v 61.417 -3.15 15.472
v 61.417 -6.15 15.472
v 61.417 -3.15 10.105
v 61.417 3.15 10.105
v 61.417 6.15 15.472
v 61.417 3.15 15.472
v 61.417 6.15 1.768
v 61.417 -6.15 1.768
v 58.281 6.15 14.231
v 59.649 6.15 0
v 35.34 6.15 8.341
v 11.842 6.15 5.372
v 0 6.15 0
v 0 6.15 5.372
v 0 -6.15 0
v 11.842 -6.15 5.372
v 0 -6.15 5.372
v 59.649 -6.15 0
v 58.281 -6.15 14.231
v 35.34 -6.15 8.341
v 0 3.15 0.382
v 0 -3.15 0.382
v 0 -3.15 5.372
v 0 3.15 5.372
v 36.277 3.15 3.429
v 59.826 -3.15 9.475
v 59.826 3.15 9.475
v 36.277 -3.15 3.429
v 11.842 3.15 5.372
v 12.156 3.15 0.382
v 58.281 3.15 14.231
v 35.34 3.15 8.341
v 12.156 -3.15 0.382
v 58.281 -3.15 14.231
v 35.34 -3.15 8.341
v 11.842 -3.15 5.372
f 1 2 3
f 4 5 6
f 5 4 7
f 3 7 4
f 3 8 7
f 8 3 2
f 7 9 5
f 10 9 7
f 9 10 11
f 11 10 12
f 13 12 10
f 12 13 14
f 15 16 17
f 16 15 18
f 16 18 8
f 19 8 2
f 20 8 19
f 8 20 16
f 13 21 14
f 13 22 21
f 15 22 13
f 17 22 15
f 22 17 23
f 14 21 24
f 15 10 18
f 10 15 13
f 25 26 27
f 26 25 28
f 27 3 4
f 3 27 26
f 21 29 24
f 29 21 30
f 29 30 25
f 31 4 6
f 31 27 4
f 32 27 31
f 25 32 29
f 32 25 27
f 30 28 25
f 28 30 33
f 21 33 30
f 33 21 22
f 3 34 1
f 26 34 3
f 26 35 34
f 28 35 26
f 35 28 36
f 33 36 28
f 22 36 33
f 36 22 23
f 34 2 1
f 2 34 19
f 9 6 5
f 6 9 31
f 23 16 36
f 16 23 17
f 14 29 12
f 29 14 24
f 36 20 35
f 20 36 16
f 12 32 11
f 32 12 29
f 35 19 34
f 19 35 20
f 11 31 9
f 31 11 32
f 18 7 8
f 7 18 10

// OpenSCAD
/* [Global] */

//Size of your spool (mm)
spool_radius = 193.6;

//Thickness of your spool's edge (mm)
spool_thickness = 6.3;

//How deep the clip will go in (mm)
clip_depth = 5;

//Length past the edge of the spool
clip_extend = 10;

//Thickness of the thinnest part of the clip (mm)
clip_thickness = 3;

//Remove sharp corner (causes overhang) 
clip_cut = true; //[true, false];

print_part();

module print_part() {
	
rotate(a=[-90,0,0])
translate([0,-spool_radius,0])
	difference(){
		//olor("yellow")
			translate([0,0,-(spool_thickness+(2*clip_thickness))/2])
				cube([sqrt(2*spool_radius*clip_extend - pow(clip_extend,2)), 
						spool_radius, 
						spool_thickness+(2*clip_thickness)]);

		//color("white")
		cylinder(r=spool_radius, h=spool_thickness, center=true, $fn=50);

		//color("gray")
			cylinder(r=spool_radius-clip_depth, h=spool_thickness+(2*clip_thickness)+1, center=true, $fn=50);

		if( clip_cut == true )
		//color("gray")
			translate([sqrt(2*spool_radius*clip_extend - pow(clip_extend,2)),spool_radius,0])
				rotate(a=[0,0,45])
					cube([clip_extend/4,clip_extend/4,spool_thickness+(2*clip_thickness)+1], center=true);
	}




}
